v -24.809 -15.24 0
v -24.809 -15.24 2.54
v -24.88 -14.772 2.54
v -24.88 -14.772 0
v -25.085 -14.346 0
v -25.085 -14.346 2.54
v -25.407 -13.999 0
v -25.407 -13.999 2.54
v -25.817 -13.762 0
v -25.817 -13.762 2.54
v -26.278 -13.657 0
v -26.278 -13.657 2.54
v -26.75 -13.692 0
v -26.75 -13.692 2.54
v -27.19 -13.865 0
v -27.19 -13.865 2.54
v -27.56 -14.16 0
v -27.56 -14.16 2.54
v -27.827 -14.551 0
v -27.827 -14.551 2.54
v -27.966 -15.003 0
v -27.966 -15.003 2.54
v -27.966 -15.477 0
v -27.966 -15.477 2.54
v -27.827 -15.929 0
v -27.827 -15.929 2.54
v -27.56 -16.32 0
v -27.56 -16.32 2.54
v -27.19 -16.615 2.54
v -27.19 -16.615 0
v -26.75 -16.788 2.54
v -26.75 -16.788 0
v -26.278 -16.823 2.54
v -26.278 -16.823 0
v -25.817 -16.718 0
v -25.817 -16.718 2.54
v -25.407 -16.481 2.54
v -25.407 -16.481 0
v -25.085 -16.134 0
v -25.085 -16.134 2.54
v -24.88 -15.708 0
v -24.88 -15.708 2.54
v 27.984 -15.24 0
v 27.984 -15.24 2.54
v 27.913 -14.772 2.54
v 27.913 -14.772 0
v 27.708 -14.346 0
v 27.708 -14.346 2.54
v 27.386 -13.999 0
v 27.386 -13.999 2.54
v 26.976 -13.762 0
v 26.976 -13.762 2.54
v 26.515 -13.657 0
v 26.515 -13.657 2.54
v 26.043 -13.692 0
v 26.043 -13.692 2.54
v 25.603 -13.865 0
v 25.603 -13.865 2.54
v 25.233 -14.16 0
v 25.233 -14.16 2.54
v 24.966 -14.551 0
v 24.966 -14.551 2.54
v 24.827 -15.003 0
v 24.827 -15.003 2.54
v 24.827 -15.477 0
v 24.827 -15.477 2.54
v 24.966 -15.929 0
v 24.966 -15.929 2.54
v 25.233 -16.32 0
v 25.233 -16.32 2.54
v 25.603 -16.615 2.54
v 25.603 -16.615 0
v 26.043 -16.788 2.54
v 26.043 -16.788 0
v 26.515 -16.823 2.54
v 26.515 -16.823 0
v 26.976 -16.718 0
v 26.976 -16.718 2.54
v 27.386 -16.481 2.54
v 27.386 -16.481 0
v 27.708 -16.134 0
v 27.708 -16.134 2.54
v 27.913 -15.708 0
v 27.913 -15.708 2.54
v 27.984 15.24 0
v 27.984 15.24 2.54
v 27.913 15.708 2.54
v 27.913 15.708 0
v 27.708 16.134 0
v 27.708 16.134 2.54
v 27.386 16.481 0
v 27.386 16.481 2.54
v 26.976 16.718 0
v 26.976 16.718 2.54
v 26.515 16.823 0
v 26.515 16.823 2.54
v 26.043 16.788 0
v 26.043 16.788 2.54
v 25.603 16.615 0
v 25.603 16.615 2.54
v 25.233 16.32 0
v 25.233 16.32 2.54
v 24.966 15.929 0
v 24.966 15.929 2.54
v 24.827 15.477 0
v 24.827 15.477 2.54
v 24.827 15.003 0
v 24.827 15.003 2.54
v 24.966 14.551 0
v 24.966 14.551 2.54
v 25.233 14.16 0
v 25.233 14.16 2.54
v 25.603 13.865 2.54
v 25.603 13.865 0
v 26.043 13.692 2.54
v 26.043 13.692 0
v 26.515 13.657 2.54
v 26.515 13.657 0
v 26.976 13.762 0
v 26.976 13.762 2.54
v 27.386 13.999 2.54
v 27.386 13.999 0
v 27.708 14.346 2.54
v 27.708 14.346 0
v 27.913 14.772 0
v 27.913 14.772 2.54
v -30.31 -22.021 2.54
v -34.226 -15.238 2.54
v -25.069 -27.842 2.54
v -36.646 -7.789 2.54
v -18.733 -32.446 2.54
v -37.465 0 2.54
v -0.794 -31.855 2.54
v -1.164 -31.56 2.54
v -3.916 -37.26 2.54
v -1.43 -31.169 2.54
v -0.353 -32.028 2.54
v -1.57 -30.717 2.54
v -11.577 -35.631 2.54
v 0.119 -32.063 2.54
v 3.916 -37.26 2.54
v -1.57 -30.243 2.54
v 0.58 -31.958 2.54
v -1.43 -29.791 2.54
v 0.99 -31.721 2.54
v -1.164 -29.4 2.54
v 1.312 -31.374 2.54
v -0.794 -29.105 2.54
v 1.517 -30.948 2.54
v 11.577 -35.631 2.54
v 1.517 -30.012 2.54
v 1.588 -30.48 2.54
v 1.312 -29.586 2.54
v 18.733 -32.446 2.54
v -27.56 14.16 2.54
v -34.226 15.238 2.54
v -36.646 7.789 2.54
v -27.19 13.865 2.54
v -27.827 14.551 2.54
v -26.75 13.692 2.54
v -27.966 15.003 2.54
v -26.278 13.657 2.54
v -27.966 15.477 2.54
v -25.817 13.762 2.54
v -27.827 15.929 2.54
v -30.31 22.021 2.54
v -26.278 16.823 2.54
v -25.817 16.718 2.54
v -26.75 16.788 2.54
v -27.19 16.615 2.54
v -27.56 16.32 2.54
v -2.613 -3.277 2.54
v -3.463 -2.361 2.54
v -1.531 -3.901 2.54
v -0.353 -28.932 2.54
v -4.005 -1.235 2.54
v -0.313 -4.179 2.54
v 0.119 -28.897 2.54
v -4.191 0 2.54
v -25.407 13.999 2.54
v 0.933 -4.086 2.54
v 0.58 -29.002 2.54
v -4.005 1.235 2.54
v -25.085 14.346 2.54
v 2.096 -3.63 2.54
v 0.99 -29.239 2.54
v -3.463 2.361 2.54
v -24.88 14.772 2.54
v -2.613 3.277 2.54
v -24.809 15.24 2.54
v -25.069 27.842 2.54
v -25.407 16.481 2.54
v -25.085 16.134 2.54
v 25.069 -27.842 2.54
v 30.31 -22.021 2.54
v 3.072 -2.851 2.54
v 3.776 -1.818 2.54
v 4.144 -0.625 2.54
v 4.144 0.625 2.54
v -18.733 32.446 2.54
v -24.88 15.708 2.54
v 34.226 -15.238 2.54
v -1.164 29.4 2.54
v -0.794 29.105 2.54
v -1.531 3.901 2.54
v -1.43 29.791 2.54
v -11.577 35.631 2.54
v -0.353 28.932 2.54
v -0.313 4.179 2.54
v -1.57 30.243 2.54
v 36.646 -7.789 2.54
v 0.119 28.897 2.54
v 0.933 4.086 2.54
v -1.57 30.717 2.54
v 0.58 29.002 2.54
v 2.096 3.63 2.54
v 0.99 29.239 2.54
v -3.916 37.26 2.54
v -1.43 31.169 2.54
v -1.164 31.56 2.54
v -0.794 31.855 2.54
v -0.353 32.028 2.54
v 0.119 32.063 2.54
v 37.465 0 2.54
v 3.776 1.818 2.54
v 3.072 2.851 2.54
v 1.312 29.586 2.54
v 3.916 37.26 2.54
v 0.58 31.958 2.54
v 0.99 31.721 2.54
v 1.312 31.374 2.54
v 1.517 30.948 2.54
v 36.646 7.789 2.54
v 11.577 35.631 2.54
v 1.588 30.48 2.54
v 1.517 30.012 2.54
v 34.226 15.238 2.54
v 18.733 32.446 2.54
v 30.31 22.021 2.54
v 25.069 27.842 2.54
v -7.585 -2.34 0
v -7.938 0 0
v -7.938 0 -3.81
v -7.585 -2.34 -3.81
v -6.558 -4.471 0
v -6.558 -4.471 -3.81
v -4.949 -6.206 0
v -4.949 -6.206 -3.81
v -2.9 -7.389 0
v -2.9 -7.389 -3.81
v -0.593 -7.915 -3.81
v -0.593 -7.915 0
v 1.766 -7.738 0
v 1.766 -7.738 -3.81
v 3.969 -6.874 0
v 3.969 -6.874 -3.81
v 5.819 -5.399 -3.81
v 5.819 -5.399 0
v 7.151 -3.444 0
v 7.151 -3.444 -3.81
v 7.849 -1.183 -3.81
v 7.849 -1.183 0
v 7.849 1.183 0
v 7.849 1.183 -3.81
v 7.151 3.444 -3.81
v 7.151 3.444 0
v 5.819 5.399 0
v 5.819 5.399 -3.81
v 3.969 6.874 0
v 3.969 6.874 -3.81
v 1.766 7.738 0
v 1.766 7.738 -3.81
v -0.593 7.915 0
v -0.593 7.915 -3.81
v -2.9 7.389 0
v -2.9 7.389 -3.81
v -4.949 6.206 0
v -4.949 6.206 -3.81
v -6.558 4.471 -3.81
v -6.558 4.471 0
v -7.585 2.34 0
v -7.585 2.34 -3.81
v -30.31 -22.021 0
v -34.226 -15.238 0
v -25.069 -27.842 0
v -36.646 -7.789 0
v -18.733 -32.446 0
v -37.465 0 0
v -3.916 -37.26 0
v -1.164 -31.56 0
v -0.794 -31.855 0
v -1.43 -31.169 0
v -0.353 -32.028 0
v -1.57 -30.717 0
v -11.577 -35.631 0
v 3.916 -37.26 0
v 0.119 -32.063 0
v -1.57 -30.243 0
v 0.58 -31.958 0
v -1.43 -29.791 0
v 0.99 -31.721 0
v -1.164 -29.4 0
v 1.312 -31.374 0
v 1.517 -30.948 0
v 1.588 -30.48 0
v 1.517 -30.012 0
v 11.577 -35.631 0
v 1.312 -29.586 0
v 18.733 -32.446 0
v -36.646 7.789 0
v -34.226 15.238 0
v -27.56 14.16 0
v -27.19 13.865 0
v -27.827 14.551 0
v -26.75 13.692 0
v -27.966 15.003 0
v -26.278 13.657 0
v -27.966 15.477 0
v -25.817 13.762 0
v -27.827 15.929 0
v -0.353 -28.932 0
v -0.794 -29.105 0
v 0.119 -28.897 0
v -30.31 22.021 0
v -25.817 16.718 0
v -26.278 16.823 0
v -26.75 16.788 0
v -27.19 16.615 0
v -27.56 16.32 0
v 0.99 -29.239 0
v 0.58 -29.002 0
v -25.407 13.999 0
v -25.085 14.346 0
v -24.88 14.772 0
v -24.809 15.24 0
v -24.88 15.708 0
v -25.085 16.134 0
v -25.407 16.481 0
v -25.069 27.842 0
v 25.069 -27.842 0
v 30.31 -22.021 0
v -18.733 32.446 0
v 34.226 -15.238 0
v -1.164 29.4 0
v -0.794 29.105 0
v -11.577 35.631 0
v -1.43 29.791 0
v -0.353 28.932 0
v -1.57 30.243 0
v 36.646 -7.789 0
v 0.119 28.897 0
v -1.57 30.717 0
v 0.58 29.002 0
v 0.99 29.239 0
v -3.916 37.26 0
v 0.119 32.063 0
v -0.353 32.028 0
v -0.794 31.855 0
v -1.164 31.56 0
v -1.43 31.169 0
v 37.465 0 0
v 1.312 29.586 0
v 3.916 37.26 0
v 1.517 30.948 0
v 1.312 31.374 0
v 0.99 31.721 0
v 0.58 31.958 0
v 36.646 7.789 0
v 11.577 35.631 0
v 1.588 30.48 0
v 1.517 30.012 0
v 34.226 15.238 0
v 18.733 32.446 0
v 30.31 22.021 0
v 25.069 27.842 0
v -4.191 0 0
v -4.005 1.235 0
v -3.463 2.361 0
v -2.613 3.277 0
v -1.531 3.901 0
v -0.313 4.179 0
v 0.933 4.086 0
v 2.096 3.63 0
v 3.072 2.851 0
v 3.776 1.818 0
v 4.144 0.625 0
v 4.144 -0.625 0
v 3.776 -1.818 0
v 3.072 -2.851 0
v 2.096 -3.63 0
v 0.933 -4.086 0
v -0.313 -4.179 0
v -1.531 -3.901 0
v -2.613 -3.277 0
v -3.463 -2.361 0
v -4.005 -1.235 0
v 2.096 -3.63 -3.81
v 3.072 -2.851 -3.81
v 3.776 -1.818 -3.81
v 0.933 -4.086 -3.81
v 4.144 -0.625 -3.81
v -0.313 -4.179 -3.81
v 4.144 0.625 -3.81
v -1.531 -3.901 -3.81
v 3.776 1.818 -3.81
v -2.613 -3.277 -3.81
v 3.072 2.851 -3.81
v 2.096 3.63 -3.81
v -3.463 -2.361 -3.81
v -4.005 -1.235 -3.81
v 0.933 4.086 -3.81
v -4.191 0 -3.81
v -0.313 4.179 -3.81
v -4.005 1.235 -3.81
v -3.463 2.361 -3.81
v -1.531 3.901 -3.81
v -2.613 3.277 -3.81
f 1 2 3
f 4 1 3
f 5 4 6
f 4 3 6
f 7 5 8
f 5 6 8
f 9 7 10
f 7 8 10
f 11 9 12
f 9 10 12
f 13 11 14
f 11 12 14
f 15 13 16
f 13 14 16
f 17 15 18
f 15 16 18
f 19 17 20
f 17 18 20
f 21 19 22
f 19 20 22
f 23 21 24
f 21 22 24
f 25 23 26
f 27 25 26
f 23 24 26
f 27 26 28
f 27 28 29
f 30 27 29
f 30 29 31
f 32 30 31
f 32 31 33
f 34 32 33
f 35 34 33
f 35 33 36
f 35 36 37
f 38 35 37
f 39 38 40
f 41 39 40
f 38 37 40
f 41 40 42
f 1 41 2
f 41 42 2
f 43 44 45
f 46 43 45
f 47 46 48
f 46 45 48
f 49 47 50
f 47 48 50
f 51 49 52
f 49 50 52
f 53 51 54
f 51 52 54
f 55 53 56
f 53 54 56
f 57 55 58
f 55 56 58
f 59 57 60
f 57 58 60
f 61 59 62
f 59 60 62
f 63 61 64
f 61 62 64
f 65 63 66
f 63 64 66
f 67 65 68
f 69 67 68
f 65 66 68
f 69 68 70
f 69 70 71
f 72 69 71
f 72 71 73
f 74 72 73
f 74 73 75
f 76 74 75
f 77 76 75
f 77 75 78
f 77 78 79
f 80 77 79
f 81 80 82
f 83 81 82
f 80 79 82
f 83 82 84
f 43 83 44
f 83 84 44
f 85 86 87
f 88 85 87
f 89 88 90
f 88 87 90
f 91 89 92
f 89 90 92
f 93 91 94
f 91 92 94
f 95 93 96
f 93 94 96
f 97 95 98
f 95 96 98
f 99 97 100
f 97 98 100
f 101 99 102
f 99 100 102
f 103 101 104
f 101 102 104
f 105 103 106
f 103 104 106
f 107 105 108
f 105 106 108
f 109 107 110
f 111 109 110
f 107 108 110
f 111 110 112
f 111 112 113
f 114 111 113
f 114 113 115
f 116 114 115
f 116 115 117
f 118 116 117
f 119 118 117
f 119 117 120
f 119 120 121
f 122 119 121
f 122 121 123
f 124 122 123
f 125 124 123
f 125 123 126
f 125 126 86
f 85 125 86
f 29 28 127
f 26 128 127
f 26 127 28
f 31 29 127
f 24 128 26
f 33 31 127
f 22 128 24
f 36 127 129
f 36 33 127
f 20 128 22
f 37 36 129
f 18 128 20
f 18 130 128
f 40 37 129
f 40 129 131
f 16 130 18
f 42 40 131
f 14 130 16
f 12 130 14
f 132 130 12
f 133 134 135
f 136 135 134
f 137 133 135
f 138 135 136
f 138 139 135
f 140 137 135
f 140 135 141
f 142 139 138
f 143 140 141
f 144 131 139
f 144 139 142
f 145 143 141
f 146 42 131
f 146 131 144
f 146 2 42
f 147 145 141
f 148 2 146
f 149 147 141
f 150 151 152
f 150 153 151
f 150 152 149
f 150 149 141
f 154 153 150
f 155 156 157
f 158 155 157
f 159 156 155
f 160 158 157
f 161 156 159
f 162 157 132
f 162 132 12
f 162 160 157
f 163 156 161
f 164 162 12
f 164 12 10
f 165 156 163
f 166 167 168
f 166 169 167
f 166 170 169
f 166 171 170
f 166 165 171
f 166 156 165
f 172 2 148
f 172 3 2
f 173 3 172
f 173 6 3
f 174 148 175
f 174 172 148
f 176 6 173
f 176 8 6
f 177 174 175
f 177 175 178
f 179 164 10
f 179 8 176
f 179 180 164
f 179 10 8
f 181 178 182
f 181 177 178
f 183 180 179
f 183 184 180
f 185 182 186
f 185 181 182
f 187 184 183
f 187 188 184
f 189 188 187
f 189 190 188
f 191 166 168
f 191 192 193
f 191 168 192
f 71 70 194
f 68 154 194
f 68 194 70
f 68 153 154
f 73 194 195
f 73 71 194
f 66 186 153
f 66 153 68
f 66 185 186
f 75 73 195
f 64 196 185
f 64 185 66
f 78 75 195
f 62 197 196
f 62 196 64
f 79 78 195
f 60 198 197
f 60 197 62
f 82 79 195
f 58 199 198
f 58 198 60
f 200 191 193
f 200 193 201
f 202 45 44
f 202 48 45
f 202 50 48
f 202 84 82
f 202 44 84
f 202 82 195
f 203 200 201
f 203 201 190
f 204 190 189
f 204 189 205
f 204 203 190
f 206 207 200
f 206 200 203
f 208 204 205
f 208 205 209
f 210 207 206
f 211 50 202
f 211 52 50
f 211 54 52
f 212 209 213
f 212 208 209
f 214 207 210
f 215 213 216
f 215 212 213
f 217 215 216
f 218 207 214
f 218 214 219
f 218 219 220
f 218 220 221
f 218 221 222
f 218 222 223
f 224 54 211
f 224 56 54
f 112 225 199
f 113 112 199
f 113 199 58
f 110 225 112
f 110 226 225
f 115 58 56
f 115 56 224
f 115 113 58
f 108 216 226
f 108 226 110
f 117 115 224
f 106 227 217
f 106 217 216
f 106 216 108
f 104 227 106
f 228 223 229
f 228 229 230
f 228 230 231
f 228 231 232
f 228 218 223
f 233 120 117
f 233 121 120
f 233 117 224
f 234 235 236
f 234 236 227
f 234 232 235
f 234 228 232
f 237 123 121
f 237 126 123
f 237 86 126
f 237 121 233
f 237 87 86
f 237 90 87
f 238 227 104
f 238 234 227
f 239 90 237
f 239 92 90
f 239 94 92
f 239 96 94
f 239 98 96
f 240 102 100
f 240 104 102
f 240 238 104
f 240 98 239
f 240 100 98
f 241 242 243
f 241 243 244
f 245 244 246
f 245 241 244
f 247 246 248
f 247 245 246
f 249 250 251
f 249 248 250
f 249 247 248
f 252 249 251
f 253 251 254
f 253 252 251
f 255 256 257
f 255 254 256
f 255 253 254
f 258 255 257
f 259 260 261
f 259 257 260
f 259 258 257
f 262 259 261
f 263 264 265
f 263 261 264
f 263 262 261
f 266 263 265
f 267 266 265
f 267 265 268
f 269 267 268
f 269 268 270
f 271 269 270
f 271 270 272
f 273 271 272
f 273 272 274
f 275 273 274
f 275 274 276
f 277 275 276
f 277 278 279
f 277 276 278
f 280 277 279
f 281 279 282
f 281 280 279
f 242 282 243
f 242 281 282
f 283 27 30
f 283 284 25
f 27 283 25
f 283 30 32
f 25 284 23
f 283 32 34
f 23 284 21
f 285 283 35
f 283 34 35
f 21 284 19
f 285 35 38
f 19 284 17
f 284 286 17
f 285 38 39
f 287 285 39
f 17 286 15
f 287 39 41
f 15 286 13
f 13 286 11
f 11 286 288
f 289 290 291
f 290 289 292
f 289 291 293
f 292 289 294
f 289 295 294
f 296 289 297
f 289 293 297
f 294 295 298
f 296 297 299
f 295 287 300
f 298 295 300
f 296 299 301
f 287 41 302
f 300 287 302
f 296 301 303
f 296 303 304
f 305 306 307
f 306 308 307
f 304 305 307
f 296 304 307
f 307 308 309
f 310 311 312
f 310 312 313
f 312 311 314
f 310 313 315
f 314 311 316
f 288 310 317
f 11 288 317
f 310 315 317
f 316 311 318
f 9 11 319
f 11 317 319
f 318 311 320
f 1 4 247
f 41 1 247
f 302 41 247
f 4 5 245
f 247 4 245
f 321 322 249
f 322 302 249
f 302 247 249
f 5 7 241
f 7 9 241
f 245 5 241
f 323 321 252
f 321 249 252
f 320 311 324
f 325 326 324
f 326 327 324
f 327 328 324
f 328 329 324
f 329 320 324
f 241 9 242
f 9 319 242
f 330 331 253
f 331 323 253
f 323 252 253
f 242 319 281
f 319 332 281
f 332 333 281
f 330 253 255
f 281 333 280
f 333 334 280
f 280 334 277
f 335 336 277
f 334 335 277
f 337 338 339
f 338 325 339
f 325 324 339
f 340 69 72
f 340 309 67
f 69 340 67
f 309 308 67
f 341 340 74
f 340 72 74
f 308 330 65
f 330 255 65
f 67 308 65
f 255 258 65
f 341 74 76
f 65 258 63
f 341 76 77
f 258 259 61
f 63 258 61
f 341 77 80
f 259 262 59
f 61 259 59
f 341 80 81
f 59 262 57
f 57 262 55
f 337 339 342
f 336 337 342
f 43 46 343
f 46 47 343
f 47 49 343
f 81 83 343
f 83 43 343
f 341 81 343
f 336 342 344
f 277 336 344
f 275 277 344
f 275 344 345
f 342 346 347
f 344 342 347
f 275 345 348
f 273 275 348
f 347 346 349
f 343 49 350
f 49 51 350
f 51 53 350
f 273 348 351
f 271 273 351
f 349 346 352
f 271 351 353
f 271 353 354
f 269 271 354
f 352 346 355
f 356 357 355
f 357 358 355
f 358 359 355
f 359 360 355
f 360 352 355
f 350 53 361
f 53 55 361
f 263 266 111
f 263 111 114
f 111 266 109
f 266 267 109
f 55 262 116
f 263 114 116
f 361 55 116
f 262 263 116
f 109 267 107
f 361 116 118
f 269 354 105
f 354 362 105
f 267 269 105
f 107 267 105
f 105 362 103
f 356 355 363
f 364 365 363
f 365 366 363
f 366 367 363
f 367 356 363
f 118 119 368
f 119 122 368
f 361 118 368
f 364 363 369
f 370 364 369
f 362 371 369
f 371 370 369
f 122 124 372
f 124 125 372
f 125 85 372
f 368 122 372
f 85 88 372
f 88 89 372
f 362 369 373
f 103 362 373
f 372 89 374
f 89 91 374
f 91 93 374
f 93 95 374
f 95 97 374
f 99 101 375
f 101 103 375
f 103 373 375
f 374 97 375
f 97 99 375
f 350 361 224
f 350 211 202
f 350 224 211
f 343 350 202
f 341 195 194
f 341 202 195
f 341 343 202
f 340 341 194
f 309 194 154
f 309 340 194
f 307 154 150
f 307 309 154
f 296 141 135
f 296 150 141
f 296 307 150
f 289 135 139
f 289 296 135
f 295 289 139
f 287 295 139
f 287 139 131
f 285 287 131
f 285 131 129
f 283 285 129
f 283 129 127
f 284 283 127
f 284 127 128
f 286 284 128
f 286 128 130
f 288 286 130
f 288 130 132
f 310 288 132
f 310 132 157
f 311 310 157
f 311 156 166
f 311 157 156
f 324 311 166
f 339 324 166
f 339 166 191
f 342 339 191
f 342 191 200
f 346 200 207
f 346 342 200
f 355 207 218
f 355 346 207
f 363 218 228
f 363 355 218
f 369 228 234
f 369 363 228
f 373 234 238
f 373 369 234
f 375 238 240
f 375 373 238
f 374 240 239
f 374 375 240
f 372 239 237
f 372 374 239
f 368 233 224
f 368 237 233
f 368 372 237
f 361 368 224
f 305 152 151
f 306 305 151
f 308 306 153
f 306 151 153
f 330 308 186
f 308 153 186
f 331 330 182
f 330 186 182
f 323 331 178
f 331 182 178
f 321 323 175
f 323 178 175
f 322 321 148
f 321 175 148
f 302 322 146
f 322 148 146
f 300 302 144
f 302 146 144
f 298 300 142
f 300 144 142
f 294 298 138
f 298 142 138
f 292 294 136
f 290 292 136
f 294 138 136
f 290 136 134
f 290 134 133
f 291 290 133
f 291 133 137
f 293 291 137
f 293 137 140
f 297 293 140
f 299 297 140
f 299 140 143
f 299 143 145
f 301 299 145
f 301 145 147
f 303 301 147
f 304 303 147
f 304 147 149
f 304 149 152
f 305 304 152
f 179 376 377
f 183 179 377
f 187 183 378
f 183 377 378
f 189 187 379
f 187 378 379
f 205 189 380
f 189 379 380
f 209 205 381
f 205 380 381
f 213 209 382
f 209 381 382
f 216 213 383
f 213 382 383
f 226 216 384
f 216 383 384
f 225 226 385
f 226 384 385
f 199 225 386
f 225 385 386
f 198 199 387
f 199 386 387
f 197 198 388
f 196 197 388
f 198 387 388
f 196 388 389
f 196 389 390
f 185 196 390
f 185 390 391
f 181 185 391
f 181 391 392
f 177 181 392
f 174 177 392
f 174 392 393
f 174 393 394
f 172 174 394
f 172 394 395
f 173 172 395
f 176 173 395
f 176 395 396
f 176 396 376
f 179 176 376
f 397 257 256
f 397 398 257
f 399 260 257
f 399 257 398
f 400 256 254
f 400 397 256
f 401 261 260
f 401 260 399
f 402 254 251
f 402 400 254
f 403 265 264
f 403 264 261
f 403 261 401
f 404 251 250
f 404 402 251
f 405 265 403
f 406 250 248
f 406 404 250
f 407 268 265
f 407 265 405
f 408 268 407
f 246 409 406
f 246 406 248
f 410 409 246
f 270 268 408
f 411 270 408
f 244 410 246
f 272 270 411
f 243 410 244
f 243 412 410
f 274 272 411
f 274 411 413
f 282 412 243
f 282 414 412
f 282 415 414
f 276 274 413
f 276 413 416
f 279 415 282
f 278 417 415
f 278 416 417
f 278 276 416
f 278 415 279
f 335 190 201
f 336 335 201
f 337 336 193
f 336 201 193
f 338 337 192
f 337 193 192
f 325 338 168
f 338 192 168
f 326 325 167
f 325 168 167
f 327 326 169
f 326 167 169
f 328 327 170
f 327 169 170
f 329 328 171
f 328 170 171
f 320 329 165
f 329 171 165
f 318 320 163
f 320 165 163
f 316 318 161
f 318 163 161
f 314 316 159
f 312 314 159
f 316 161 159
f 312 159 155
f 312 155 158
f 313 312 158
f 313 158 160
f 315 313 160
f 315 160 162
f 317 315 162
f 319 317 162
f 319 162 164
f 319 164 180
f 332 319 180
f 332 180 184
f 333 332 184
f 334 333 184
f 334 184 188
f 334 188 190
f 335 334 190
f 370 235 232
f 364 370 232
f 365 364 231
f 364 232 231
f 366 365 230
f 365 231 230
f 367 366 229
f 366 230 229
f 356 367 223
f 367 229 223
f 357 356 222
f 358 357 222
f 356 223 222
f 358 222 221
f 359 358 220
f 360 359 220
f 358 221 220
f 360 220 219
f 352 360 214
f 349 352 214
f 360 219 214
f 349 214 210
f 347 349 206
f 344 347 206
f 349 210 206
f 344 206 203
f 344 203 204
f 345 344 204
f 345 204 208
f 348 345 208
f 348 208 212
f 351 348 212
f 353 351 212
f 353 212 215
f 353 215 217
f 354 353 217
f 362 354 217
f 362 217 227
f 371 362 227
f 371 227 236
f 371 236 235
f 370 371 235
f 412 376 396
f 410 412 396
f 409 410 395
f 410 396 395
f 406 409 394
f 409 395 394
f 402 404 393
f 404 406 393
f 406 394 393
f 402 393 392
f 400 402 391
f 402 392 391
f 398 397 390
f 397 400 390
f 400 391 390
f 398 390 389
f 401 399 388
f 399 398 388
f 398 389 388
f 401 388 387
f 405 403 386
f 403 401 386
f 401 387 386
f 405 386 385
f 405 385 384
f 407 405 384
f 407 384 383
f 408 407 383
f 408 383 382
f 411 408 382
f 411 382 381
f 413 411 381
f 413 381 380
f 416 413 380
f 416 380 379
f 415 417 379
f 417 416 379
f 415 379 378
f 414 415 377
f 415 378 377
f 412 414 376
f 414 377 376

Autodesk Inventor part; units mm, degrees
ref_plane "YZ Plane" through (0, 0, 0) normal (1, 0, 0) x (0, 1, 0)
ref_plane "XZ Plane" through (0, 0, 0) normal (0, 1, 0) x (-1, 0, 0)
ref_plane "XY Plane" through (0, 0, 0) normal (0, 0, 1) x (1, 0, 0)
sketch "Sketch1" plane through (0, 0, 0) normal (0, 0, 1) x (1, 0, 0)
  circle A0 centre (0, 0) radius 37.465
  dimension "d0" = 74.93
extrude "Extrusion1" add sketch "Sketch1" along normal blind 2.54
sketch "Sketch3" plane through (0, 0, 0) normal (0, 0, -1) x (-1, 0, 0)
  circle A0 centre (0, 0) radius 4.191
  circle A1 centre (0, 0) radius 7.9375
  circle A2 centre (0, 0) radius 2.3813
  dimension "d4" = 8.382
  dimension "d5" = 15.875
  dimension "d6" = 4.7625
extrude "Extrusion3" cut sketch "Sketch3" against normal through all contours A0 | A2
extrude "Extrusion4" add sketch "Sketch3" along normal blind 3.81 contours A1
sketch "Sketch4" plane through (0, 0, 2.54) normal (0, 0, 1) x (1, 0, 0)
  line L0 (0, 0) -> (0, 30.48)
  circle A0 centre (0, 30.48) radius 1.5875
  circle A1 centre (-26.3965, 15.24) radius 1.5875
  circle A2 centre (-26.3965, -15.24) radius 1.5875
  circle A3 centre (0, -30.48) radius 1.5875
  circle A4 centre (26.3965, -15.24) radius 1.5875
  circle A5 centre (26.3965, 15.24) radius 1.5875
  dimension "d13" = 30.48
  dimension "d14" = 3.175
  dimension "d17" = 360
extrude "Extrusion5" cut sketch "Sketch4" against normal blind 25.4
properties part number "SpoolEndFrontSide"
